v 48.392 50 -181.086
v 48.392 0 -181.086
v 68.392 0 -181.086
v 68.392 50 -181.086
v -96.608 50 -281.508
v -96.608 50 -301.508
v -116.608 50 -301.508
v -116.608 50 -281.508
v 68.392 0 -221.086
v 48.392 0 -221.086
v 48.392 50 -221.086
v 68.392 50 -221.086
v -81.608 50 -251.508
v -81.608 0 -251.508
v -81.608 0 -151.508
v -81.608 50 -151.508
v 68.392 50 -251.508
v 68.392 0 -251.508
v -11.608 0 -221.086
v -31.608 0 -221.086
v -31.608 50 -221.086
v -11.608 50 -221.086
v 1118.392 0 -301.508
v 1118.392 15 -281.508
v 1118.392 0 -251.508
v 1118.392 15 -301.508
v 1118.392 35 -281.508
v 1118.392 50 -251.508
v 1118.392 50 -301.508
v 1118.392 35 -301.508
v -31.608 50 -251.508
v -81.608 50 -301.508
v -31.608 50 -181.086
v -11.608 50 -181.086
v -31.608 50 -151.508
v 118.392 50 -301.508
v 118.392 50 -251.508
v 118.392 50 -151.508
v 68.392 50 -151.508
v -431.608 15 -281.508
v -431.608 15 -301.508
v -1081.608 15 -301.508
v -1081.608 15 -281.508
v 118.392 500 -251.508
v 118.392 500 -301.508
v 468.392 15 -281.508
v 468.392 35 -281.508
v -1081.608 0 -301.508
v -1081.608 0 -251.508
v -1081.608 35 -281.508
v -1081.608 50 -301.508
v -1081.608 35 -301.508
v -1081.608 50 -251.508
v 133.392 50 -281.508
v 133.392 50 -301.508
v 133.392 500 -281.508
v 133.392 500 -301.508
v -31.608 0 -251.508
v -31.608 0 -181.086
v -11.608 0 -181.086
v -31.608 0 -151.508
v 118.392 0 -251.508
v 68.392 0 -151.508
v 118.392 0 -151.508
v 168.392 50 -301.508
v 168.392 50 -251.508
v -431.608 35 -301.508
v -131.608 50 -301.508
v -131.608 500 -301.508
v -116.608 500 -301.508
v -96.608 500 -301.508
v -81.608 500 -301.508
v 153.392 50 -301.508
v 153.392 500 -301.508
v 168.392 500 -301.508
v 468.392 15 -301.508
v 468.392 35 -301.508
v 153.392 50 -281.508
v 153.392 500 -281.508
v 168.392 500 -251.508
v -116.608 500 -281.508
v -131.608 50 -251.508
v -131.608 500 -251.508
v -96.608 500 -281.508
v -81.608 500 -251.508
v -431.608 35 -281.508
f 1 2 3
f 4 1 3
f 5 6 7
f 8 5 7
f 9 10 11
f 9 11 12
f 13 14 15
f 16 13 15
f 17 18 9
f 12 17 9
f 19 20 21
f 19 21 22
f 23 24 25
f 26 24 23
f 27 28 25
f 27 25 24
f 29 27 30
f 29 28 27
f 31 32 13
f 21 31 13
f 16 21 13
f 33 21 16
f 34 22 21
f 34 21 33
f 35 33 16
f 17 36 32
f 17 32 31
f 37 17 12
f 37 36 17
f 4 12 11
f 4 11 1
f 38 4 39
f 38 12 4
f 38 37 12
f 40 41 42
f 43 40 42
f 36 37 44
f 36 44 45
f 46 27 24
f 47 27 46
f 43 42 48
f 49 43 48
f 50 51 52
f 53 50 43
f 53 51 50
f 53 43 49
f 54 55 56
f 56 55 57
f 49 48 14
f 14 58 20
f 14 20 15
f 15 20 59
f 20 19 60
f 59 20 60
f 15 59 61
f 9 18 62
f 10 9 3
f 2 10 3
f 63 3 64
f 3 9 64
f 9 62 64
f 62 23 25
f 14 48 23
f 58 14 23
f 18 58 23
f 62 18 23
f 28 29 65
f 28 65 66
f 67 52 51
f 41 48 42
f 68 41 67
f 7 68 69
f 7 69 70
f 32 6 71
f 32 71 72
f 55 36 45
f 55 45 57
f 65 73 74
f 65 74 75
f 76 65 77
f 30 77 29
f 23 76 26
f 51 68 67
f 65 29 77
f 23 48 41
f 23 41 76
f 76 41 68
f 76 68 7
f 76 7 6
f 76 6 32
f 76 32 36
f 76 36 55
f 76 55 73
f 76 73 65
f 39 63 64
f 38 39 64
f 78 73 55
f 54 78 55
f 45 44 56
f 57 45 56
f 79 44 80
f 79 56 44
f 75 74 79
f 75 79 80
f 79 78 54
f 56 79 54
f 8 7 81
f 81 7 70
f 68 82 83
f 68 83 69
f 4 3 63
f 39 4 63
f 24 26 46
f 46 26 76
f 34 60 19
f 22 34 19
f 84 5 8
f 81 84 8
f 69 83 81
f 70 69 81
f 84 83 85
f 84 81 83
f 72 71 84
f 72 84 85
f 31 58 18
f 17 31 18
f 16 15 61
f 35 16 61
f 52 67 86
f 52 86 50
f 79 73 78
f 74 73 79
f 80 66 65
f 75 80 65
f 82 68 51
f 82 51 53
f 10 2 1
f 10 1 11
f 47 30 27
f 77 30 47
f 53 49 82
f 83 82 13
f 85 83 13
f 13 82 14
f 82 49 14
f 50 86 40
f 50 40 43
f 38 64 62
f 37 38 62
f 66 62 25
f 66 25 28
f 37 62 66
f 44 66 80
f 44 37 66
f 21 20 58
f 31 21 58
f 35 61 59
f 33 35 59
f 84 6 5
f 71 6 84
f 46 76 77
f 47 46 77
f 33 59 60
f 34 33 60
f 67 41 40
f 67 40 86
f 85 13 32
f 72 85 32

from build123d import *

# Parameters (mm, degrees)
SKETCH1_W           = 20
SKETCH1_H           = 40
BOSS_EXTRUDE1_DEPTH = 50
SKETCH2_W           = 50
SKETCH2_H           = 50
BOSS_EXTRUDE2_DEPTH = 1000
SKETCH3_W           = 50
SKETCH3_H           = 50
BOSS_EXTRUDE3_DEPTH = 1000
SKETCH4_W           = 50
SKETCH4_H           = 50
BOSS_EXTRUDE4_DEPTH = 450
SKETCH6_W           = 650
SKETCH6_H           = 20
CUT_EXTRUDE2_DEPTH  = 20
SKETCH7_W           = 20
SKETCH7_H           = 450
CUT_EXTRUDE3_DEPTH  = 20


with BuildPart() as part:
    # Sketch1 → Boss-Extrude1 (new body)
    with BuildSketch(Plane(origin=(0, 0, 0), x_dir=(1, 0, 0), z_dir=(0, 1, 0))):
        Polygon((-31.607653806, 251.508316195), (0, 251.508316195), (68.392346194, 251.508316195), (68.392346194, 221.086115448), (68.392346194, 181.086115448), (68.392346194, 151.508316195), (118.392346194, 151.508316195), (118.392346194, 301.508316195), (-81.607653806, 301.508316195), (-81.607653806, 151.508316195), (-31.607653806, 151.508316195), (-31.607653806, 181.086115448), (-31.607653806, 221.086115448), align=None)
        with Locations((-21.607653806, 201.086115448)):
            Rectangle(SKETCH1_W, SKETCH1_H)
        with Locations((58.392346194, 201.086115448)):
            Rectangle(SKETCH1_W, SKETCH1_H)
    extrude(amount=BOSS_EXTRUDE1_DEPTH)

    # Sketch2 → Boss-Extrude2 (add)
    with BuildSketch(Plane(origin=(118.392346194, 0, 0), x_dir=(0, 0, -1), z_dir=(1, 0, 0))):
        with Locations((276.508316195, 25)):
            Rectangle(SKETCH2_W, SKETCH2_H)
    extrude(amount=BOSS_EXTRUDE2_DEPTH)

    # Sketch3 → Boss-Extrude3 (add)
    with BuildSketch(Plane.ZY.offset(81.607653806)):
        with Locations((-276.508316195, 25)):
            Rectangle(SKETCH3_W, SKETCH3_H)
    extrude(amount=BOSS_EXTRUDE3_DEPTH)

    # Sketch4 → Boss-Extrude4 (add)
    with BuildSketch(Plane(origin=(0, 50, 0), x_dir=(1, 0, 0), z_dir=(0, 1, 0))):
        with Locations((-106.607653806, 276.508316195)):
            Rectangle(SKETCH4_W, SKETCH4_H)
        with Locations((143.392346194, 276.508316195)):
            Rectangle(SKETCH4_W, SKETCH4_H)
    extrude(amount=BOSS_EXTRUDE4_DEPTH)

    # Sketch6 → Cut-Extrude2 (cut)
    with BuildSketch(Plane(origin=(0, 0, -301.508316195), x_dir=(-1, 0, 0), z_dir=(0, 0, -1))):
        with Locations((756.607653806, 25)):
            Rectangle(SKETCH6_W, SKETCH6_H)
        with Locations((-793.392346194, 25)):
            Rectangle(SKETCH6_W, SKETCH6_H)
    extrude(amount=-CUT_EXTRUDE2_DEPTH, mode=Mode.SUBTRACT)

    # Sketch7 → Cut-Extrude3 (cut)
    with BuildSketch(Plane(origin=(0, 0, -301.508316195), x_dir=(-1, 0, 0), z_dir=(0, 0, -1))):
        with Locations((-143.392346194, 275)):
            Rectangle(SKETCH7_W, SKETCH7_H)
        with Locations((106.607653806, 275)):
            Rectangle(SKETCH7_W, SKETCH7_H)
    extrude(amount=-CUT_EXTRUDE3_DEPTH, mode=Mode.SUBTRACT)


solid = part.part
